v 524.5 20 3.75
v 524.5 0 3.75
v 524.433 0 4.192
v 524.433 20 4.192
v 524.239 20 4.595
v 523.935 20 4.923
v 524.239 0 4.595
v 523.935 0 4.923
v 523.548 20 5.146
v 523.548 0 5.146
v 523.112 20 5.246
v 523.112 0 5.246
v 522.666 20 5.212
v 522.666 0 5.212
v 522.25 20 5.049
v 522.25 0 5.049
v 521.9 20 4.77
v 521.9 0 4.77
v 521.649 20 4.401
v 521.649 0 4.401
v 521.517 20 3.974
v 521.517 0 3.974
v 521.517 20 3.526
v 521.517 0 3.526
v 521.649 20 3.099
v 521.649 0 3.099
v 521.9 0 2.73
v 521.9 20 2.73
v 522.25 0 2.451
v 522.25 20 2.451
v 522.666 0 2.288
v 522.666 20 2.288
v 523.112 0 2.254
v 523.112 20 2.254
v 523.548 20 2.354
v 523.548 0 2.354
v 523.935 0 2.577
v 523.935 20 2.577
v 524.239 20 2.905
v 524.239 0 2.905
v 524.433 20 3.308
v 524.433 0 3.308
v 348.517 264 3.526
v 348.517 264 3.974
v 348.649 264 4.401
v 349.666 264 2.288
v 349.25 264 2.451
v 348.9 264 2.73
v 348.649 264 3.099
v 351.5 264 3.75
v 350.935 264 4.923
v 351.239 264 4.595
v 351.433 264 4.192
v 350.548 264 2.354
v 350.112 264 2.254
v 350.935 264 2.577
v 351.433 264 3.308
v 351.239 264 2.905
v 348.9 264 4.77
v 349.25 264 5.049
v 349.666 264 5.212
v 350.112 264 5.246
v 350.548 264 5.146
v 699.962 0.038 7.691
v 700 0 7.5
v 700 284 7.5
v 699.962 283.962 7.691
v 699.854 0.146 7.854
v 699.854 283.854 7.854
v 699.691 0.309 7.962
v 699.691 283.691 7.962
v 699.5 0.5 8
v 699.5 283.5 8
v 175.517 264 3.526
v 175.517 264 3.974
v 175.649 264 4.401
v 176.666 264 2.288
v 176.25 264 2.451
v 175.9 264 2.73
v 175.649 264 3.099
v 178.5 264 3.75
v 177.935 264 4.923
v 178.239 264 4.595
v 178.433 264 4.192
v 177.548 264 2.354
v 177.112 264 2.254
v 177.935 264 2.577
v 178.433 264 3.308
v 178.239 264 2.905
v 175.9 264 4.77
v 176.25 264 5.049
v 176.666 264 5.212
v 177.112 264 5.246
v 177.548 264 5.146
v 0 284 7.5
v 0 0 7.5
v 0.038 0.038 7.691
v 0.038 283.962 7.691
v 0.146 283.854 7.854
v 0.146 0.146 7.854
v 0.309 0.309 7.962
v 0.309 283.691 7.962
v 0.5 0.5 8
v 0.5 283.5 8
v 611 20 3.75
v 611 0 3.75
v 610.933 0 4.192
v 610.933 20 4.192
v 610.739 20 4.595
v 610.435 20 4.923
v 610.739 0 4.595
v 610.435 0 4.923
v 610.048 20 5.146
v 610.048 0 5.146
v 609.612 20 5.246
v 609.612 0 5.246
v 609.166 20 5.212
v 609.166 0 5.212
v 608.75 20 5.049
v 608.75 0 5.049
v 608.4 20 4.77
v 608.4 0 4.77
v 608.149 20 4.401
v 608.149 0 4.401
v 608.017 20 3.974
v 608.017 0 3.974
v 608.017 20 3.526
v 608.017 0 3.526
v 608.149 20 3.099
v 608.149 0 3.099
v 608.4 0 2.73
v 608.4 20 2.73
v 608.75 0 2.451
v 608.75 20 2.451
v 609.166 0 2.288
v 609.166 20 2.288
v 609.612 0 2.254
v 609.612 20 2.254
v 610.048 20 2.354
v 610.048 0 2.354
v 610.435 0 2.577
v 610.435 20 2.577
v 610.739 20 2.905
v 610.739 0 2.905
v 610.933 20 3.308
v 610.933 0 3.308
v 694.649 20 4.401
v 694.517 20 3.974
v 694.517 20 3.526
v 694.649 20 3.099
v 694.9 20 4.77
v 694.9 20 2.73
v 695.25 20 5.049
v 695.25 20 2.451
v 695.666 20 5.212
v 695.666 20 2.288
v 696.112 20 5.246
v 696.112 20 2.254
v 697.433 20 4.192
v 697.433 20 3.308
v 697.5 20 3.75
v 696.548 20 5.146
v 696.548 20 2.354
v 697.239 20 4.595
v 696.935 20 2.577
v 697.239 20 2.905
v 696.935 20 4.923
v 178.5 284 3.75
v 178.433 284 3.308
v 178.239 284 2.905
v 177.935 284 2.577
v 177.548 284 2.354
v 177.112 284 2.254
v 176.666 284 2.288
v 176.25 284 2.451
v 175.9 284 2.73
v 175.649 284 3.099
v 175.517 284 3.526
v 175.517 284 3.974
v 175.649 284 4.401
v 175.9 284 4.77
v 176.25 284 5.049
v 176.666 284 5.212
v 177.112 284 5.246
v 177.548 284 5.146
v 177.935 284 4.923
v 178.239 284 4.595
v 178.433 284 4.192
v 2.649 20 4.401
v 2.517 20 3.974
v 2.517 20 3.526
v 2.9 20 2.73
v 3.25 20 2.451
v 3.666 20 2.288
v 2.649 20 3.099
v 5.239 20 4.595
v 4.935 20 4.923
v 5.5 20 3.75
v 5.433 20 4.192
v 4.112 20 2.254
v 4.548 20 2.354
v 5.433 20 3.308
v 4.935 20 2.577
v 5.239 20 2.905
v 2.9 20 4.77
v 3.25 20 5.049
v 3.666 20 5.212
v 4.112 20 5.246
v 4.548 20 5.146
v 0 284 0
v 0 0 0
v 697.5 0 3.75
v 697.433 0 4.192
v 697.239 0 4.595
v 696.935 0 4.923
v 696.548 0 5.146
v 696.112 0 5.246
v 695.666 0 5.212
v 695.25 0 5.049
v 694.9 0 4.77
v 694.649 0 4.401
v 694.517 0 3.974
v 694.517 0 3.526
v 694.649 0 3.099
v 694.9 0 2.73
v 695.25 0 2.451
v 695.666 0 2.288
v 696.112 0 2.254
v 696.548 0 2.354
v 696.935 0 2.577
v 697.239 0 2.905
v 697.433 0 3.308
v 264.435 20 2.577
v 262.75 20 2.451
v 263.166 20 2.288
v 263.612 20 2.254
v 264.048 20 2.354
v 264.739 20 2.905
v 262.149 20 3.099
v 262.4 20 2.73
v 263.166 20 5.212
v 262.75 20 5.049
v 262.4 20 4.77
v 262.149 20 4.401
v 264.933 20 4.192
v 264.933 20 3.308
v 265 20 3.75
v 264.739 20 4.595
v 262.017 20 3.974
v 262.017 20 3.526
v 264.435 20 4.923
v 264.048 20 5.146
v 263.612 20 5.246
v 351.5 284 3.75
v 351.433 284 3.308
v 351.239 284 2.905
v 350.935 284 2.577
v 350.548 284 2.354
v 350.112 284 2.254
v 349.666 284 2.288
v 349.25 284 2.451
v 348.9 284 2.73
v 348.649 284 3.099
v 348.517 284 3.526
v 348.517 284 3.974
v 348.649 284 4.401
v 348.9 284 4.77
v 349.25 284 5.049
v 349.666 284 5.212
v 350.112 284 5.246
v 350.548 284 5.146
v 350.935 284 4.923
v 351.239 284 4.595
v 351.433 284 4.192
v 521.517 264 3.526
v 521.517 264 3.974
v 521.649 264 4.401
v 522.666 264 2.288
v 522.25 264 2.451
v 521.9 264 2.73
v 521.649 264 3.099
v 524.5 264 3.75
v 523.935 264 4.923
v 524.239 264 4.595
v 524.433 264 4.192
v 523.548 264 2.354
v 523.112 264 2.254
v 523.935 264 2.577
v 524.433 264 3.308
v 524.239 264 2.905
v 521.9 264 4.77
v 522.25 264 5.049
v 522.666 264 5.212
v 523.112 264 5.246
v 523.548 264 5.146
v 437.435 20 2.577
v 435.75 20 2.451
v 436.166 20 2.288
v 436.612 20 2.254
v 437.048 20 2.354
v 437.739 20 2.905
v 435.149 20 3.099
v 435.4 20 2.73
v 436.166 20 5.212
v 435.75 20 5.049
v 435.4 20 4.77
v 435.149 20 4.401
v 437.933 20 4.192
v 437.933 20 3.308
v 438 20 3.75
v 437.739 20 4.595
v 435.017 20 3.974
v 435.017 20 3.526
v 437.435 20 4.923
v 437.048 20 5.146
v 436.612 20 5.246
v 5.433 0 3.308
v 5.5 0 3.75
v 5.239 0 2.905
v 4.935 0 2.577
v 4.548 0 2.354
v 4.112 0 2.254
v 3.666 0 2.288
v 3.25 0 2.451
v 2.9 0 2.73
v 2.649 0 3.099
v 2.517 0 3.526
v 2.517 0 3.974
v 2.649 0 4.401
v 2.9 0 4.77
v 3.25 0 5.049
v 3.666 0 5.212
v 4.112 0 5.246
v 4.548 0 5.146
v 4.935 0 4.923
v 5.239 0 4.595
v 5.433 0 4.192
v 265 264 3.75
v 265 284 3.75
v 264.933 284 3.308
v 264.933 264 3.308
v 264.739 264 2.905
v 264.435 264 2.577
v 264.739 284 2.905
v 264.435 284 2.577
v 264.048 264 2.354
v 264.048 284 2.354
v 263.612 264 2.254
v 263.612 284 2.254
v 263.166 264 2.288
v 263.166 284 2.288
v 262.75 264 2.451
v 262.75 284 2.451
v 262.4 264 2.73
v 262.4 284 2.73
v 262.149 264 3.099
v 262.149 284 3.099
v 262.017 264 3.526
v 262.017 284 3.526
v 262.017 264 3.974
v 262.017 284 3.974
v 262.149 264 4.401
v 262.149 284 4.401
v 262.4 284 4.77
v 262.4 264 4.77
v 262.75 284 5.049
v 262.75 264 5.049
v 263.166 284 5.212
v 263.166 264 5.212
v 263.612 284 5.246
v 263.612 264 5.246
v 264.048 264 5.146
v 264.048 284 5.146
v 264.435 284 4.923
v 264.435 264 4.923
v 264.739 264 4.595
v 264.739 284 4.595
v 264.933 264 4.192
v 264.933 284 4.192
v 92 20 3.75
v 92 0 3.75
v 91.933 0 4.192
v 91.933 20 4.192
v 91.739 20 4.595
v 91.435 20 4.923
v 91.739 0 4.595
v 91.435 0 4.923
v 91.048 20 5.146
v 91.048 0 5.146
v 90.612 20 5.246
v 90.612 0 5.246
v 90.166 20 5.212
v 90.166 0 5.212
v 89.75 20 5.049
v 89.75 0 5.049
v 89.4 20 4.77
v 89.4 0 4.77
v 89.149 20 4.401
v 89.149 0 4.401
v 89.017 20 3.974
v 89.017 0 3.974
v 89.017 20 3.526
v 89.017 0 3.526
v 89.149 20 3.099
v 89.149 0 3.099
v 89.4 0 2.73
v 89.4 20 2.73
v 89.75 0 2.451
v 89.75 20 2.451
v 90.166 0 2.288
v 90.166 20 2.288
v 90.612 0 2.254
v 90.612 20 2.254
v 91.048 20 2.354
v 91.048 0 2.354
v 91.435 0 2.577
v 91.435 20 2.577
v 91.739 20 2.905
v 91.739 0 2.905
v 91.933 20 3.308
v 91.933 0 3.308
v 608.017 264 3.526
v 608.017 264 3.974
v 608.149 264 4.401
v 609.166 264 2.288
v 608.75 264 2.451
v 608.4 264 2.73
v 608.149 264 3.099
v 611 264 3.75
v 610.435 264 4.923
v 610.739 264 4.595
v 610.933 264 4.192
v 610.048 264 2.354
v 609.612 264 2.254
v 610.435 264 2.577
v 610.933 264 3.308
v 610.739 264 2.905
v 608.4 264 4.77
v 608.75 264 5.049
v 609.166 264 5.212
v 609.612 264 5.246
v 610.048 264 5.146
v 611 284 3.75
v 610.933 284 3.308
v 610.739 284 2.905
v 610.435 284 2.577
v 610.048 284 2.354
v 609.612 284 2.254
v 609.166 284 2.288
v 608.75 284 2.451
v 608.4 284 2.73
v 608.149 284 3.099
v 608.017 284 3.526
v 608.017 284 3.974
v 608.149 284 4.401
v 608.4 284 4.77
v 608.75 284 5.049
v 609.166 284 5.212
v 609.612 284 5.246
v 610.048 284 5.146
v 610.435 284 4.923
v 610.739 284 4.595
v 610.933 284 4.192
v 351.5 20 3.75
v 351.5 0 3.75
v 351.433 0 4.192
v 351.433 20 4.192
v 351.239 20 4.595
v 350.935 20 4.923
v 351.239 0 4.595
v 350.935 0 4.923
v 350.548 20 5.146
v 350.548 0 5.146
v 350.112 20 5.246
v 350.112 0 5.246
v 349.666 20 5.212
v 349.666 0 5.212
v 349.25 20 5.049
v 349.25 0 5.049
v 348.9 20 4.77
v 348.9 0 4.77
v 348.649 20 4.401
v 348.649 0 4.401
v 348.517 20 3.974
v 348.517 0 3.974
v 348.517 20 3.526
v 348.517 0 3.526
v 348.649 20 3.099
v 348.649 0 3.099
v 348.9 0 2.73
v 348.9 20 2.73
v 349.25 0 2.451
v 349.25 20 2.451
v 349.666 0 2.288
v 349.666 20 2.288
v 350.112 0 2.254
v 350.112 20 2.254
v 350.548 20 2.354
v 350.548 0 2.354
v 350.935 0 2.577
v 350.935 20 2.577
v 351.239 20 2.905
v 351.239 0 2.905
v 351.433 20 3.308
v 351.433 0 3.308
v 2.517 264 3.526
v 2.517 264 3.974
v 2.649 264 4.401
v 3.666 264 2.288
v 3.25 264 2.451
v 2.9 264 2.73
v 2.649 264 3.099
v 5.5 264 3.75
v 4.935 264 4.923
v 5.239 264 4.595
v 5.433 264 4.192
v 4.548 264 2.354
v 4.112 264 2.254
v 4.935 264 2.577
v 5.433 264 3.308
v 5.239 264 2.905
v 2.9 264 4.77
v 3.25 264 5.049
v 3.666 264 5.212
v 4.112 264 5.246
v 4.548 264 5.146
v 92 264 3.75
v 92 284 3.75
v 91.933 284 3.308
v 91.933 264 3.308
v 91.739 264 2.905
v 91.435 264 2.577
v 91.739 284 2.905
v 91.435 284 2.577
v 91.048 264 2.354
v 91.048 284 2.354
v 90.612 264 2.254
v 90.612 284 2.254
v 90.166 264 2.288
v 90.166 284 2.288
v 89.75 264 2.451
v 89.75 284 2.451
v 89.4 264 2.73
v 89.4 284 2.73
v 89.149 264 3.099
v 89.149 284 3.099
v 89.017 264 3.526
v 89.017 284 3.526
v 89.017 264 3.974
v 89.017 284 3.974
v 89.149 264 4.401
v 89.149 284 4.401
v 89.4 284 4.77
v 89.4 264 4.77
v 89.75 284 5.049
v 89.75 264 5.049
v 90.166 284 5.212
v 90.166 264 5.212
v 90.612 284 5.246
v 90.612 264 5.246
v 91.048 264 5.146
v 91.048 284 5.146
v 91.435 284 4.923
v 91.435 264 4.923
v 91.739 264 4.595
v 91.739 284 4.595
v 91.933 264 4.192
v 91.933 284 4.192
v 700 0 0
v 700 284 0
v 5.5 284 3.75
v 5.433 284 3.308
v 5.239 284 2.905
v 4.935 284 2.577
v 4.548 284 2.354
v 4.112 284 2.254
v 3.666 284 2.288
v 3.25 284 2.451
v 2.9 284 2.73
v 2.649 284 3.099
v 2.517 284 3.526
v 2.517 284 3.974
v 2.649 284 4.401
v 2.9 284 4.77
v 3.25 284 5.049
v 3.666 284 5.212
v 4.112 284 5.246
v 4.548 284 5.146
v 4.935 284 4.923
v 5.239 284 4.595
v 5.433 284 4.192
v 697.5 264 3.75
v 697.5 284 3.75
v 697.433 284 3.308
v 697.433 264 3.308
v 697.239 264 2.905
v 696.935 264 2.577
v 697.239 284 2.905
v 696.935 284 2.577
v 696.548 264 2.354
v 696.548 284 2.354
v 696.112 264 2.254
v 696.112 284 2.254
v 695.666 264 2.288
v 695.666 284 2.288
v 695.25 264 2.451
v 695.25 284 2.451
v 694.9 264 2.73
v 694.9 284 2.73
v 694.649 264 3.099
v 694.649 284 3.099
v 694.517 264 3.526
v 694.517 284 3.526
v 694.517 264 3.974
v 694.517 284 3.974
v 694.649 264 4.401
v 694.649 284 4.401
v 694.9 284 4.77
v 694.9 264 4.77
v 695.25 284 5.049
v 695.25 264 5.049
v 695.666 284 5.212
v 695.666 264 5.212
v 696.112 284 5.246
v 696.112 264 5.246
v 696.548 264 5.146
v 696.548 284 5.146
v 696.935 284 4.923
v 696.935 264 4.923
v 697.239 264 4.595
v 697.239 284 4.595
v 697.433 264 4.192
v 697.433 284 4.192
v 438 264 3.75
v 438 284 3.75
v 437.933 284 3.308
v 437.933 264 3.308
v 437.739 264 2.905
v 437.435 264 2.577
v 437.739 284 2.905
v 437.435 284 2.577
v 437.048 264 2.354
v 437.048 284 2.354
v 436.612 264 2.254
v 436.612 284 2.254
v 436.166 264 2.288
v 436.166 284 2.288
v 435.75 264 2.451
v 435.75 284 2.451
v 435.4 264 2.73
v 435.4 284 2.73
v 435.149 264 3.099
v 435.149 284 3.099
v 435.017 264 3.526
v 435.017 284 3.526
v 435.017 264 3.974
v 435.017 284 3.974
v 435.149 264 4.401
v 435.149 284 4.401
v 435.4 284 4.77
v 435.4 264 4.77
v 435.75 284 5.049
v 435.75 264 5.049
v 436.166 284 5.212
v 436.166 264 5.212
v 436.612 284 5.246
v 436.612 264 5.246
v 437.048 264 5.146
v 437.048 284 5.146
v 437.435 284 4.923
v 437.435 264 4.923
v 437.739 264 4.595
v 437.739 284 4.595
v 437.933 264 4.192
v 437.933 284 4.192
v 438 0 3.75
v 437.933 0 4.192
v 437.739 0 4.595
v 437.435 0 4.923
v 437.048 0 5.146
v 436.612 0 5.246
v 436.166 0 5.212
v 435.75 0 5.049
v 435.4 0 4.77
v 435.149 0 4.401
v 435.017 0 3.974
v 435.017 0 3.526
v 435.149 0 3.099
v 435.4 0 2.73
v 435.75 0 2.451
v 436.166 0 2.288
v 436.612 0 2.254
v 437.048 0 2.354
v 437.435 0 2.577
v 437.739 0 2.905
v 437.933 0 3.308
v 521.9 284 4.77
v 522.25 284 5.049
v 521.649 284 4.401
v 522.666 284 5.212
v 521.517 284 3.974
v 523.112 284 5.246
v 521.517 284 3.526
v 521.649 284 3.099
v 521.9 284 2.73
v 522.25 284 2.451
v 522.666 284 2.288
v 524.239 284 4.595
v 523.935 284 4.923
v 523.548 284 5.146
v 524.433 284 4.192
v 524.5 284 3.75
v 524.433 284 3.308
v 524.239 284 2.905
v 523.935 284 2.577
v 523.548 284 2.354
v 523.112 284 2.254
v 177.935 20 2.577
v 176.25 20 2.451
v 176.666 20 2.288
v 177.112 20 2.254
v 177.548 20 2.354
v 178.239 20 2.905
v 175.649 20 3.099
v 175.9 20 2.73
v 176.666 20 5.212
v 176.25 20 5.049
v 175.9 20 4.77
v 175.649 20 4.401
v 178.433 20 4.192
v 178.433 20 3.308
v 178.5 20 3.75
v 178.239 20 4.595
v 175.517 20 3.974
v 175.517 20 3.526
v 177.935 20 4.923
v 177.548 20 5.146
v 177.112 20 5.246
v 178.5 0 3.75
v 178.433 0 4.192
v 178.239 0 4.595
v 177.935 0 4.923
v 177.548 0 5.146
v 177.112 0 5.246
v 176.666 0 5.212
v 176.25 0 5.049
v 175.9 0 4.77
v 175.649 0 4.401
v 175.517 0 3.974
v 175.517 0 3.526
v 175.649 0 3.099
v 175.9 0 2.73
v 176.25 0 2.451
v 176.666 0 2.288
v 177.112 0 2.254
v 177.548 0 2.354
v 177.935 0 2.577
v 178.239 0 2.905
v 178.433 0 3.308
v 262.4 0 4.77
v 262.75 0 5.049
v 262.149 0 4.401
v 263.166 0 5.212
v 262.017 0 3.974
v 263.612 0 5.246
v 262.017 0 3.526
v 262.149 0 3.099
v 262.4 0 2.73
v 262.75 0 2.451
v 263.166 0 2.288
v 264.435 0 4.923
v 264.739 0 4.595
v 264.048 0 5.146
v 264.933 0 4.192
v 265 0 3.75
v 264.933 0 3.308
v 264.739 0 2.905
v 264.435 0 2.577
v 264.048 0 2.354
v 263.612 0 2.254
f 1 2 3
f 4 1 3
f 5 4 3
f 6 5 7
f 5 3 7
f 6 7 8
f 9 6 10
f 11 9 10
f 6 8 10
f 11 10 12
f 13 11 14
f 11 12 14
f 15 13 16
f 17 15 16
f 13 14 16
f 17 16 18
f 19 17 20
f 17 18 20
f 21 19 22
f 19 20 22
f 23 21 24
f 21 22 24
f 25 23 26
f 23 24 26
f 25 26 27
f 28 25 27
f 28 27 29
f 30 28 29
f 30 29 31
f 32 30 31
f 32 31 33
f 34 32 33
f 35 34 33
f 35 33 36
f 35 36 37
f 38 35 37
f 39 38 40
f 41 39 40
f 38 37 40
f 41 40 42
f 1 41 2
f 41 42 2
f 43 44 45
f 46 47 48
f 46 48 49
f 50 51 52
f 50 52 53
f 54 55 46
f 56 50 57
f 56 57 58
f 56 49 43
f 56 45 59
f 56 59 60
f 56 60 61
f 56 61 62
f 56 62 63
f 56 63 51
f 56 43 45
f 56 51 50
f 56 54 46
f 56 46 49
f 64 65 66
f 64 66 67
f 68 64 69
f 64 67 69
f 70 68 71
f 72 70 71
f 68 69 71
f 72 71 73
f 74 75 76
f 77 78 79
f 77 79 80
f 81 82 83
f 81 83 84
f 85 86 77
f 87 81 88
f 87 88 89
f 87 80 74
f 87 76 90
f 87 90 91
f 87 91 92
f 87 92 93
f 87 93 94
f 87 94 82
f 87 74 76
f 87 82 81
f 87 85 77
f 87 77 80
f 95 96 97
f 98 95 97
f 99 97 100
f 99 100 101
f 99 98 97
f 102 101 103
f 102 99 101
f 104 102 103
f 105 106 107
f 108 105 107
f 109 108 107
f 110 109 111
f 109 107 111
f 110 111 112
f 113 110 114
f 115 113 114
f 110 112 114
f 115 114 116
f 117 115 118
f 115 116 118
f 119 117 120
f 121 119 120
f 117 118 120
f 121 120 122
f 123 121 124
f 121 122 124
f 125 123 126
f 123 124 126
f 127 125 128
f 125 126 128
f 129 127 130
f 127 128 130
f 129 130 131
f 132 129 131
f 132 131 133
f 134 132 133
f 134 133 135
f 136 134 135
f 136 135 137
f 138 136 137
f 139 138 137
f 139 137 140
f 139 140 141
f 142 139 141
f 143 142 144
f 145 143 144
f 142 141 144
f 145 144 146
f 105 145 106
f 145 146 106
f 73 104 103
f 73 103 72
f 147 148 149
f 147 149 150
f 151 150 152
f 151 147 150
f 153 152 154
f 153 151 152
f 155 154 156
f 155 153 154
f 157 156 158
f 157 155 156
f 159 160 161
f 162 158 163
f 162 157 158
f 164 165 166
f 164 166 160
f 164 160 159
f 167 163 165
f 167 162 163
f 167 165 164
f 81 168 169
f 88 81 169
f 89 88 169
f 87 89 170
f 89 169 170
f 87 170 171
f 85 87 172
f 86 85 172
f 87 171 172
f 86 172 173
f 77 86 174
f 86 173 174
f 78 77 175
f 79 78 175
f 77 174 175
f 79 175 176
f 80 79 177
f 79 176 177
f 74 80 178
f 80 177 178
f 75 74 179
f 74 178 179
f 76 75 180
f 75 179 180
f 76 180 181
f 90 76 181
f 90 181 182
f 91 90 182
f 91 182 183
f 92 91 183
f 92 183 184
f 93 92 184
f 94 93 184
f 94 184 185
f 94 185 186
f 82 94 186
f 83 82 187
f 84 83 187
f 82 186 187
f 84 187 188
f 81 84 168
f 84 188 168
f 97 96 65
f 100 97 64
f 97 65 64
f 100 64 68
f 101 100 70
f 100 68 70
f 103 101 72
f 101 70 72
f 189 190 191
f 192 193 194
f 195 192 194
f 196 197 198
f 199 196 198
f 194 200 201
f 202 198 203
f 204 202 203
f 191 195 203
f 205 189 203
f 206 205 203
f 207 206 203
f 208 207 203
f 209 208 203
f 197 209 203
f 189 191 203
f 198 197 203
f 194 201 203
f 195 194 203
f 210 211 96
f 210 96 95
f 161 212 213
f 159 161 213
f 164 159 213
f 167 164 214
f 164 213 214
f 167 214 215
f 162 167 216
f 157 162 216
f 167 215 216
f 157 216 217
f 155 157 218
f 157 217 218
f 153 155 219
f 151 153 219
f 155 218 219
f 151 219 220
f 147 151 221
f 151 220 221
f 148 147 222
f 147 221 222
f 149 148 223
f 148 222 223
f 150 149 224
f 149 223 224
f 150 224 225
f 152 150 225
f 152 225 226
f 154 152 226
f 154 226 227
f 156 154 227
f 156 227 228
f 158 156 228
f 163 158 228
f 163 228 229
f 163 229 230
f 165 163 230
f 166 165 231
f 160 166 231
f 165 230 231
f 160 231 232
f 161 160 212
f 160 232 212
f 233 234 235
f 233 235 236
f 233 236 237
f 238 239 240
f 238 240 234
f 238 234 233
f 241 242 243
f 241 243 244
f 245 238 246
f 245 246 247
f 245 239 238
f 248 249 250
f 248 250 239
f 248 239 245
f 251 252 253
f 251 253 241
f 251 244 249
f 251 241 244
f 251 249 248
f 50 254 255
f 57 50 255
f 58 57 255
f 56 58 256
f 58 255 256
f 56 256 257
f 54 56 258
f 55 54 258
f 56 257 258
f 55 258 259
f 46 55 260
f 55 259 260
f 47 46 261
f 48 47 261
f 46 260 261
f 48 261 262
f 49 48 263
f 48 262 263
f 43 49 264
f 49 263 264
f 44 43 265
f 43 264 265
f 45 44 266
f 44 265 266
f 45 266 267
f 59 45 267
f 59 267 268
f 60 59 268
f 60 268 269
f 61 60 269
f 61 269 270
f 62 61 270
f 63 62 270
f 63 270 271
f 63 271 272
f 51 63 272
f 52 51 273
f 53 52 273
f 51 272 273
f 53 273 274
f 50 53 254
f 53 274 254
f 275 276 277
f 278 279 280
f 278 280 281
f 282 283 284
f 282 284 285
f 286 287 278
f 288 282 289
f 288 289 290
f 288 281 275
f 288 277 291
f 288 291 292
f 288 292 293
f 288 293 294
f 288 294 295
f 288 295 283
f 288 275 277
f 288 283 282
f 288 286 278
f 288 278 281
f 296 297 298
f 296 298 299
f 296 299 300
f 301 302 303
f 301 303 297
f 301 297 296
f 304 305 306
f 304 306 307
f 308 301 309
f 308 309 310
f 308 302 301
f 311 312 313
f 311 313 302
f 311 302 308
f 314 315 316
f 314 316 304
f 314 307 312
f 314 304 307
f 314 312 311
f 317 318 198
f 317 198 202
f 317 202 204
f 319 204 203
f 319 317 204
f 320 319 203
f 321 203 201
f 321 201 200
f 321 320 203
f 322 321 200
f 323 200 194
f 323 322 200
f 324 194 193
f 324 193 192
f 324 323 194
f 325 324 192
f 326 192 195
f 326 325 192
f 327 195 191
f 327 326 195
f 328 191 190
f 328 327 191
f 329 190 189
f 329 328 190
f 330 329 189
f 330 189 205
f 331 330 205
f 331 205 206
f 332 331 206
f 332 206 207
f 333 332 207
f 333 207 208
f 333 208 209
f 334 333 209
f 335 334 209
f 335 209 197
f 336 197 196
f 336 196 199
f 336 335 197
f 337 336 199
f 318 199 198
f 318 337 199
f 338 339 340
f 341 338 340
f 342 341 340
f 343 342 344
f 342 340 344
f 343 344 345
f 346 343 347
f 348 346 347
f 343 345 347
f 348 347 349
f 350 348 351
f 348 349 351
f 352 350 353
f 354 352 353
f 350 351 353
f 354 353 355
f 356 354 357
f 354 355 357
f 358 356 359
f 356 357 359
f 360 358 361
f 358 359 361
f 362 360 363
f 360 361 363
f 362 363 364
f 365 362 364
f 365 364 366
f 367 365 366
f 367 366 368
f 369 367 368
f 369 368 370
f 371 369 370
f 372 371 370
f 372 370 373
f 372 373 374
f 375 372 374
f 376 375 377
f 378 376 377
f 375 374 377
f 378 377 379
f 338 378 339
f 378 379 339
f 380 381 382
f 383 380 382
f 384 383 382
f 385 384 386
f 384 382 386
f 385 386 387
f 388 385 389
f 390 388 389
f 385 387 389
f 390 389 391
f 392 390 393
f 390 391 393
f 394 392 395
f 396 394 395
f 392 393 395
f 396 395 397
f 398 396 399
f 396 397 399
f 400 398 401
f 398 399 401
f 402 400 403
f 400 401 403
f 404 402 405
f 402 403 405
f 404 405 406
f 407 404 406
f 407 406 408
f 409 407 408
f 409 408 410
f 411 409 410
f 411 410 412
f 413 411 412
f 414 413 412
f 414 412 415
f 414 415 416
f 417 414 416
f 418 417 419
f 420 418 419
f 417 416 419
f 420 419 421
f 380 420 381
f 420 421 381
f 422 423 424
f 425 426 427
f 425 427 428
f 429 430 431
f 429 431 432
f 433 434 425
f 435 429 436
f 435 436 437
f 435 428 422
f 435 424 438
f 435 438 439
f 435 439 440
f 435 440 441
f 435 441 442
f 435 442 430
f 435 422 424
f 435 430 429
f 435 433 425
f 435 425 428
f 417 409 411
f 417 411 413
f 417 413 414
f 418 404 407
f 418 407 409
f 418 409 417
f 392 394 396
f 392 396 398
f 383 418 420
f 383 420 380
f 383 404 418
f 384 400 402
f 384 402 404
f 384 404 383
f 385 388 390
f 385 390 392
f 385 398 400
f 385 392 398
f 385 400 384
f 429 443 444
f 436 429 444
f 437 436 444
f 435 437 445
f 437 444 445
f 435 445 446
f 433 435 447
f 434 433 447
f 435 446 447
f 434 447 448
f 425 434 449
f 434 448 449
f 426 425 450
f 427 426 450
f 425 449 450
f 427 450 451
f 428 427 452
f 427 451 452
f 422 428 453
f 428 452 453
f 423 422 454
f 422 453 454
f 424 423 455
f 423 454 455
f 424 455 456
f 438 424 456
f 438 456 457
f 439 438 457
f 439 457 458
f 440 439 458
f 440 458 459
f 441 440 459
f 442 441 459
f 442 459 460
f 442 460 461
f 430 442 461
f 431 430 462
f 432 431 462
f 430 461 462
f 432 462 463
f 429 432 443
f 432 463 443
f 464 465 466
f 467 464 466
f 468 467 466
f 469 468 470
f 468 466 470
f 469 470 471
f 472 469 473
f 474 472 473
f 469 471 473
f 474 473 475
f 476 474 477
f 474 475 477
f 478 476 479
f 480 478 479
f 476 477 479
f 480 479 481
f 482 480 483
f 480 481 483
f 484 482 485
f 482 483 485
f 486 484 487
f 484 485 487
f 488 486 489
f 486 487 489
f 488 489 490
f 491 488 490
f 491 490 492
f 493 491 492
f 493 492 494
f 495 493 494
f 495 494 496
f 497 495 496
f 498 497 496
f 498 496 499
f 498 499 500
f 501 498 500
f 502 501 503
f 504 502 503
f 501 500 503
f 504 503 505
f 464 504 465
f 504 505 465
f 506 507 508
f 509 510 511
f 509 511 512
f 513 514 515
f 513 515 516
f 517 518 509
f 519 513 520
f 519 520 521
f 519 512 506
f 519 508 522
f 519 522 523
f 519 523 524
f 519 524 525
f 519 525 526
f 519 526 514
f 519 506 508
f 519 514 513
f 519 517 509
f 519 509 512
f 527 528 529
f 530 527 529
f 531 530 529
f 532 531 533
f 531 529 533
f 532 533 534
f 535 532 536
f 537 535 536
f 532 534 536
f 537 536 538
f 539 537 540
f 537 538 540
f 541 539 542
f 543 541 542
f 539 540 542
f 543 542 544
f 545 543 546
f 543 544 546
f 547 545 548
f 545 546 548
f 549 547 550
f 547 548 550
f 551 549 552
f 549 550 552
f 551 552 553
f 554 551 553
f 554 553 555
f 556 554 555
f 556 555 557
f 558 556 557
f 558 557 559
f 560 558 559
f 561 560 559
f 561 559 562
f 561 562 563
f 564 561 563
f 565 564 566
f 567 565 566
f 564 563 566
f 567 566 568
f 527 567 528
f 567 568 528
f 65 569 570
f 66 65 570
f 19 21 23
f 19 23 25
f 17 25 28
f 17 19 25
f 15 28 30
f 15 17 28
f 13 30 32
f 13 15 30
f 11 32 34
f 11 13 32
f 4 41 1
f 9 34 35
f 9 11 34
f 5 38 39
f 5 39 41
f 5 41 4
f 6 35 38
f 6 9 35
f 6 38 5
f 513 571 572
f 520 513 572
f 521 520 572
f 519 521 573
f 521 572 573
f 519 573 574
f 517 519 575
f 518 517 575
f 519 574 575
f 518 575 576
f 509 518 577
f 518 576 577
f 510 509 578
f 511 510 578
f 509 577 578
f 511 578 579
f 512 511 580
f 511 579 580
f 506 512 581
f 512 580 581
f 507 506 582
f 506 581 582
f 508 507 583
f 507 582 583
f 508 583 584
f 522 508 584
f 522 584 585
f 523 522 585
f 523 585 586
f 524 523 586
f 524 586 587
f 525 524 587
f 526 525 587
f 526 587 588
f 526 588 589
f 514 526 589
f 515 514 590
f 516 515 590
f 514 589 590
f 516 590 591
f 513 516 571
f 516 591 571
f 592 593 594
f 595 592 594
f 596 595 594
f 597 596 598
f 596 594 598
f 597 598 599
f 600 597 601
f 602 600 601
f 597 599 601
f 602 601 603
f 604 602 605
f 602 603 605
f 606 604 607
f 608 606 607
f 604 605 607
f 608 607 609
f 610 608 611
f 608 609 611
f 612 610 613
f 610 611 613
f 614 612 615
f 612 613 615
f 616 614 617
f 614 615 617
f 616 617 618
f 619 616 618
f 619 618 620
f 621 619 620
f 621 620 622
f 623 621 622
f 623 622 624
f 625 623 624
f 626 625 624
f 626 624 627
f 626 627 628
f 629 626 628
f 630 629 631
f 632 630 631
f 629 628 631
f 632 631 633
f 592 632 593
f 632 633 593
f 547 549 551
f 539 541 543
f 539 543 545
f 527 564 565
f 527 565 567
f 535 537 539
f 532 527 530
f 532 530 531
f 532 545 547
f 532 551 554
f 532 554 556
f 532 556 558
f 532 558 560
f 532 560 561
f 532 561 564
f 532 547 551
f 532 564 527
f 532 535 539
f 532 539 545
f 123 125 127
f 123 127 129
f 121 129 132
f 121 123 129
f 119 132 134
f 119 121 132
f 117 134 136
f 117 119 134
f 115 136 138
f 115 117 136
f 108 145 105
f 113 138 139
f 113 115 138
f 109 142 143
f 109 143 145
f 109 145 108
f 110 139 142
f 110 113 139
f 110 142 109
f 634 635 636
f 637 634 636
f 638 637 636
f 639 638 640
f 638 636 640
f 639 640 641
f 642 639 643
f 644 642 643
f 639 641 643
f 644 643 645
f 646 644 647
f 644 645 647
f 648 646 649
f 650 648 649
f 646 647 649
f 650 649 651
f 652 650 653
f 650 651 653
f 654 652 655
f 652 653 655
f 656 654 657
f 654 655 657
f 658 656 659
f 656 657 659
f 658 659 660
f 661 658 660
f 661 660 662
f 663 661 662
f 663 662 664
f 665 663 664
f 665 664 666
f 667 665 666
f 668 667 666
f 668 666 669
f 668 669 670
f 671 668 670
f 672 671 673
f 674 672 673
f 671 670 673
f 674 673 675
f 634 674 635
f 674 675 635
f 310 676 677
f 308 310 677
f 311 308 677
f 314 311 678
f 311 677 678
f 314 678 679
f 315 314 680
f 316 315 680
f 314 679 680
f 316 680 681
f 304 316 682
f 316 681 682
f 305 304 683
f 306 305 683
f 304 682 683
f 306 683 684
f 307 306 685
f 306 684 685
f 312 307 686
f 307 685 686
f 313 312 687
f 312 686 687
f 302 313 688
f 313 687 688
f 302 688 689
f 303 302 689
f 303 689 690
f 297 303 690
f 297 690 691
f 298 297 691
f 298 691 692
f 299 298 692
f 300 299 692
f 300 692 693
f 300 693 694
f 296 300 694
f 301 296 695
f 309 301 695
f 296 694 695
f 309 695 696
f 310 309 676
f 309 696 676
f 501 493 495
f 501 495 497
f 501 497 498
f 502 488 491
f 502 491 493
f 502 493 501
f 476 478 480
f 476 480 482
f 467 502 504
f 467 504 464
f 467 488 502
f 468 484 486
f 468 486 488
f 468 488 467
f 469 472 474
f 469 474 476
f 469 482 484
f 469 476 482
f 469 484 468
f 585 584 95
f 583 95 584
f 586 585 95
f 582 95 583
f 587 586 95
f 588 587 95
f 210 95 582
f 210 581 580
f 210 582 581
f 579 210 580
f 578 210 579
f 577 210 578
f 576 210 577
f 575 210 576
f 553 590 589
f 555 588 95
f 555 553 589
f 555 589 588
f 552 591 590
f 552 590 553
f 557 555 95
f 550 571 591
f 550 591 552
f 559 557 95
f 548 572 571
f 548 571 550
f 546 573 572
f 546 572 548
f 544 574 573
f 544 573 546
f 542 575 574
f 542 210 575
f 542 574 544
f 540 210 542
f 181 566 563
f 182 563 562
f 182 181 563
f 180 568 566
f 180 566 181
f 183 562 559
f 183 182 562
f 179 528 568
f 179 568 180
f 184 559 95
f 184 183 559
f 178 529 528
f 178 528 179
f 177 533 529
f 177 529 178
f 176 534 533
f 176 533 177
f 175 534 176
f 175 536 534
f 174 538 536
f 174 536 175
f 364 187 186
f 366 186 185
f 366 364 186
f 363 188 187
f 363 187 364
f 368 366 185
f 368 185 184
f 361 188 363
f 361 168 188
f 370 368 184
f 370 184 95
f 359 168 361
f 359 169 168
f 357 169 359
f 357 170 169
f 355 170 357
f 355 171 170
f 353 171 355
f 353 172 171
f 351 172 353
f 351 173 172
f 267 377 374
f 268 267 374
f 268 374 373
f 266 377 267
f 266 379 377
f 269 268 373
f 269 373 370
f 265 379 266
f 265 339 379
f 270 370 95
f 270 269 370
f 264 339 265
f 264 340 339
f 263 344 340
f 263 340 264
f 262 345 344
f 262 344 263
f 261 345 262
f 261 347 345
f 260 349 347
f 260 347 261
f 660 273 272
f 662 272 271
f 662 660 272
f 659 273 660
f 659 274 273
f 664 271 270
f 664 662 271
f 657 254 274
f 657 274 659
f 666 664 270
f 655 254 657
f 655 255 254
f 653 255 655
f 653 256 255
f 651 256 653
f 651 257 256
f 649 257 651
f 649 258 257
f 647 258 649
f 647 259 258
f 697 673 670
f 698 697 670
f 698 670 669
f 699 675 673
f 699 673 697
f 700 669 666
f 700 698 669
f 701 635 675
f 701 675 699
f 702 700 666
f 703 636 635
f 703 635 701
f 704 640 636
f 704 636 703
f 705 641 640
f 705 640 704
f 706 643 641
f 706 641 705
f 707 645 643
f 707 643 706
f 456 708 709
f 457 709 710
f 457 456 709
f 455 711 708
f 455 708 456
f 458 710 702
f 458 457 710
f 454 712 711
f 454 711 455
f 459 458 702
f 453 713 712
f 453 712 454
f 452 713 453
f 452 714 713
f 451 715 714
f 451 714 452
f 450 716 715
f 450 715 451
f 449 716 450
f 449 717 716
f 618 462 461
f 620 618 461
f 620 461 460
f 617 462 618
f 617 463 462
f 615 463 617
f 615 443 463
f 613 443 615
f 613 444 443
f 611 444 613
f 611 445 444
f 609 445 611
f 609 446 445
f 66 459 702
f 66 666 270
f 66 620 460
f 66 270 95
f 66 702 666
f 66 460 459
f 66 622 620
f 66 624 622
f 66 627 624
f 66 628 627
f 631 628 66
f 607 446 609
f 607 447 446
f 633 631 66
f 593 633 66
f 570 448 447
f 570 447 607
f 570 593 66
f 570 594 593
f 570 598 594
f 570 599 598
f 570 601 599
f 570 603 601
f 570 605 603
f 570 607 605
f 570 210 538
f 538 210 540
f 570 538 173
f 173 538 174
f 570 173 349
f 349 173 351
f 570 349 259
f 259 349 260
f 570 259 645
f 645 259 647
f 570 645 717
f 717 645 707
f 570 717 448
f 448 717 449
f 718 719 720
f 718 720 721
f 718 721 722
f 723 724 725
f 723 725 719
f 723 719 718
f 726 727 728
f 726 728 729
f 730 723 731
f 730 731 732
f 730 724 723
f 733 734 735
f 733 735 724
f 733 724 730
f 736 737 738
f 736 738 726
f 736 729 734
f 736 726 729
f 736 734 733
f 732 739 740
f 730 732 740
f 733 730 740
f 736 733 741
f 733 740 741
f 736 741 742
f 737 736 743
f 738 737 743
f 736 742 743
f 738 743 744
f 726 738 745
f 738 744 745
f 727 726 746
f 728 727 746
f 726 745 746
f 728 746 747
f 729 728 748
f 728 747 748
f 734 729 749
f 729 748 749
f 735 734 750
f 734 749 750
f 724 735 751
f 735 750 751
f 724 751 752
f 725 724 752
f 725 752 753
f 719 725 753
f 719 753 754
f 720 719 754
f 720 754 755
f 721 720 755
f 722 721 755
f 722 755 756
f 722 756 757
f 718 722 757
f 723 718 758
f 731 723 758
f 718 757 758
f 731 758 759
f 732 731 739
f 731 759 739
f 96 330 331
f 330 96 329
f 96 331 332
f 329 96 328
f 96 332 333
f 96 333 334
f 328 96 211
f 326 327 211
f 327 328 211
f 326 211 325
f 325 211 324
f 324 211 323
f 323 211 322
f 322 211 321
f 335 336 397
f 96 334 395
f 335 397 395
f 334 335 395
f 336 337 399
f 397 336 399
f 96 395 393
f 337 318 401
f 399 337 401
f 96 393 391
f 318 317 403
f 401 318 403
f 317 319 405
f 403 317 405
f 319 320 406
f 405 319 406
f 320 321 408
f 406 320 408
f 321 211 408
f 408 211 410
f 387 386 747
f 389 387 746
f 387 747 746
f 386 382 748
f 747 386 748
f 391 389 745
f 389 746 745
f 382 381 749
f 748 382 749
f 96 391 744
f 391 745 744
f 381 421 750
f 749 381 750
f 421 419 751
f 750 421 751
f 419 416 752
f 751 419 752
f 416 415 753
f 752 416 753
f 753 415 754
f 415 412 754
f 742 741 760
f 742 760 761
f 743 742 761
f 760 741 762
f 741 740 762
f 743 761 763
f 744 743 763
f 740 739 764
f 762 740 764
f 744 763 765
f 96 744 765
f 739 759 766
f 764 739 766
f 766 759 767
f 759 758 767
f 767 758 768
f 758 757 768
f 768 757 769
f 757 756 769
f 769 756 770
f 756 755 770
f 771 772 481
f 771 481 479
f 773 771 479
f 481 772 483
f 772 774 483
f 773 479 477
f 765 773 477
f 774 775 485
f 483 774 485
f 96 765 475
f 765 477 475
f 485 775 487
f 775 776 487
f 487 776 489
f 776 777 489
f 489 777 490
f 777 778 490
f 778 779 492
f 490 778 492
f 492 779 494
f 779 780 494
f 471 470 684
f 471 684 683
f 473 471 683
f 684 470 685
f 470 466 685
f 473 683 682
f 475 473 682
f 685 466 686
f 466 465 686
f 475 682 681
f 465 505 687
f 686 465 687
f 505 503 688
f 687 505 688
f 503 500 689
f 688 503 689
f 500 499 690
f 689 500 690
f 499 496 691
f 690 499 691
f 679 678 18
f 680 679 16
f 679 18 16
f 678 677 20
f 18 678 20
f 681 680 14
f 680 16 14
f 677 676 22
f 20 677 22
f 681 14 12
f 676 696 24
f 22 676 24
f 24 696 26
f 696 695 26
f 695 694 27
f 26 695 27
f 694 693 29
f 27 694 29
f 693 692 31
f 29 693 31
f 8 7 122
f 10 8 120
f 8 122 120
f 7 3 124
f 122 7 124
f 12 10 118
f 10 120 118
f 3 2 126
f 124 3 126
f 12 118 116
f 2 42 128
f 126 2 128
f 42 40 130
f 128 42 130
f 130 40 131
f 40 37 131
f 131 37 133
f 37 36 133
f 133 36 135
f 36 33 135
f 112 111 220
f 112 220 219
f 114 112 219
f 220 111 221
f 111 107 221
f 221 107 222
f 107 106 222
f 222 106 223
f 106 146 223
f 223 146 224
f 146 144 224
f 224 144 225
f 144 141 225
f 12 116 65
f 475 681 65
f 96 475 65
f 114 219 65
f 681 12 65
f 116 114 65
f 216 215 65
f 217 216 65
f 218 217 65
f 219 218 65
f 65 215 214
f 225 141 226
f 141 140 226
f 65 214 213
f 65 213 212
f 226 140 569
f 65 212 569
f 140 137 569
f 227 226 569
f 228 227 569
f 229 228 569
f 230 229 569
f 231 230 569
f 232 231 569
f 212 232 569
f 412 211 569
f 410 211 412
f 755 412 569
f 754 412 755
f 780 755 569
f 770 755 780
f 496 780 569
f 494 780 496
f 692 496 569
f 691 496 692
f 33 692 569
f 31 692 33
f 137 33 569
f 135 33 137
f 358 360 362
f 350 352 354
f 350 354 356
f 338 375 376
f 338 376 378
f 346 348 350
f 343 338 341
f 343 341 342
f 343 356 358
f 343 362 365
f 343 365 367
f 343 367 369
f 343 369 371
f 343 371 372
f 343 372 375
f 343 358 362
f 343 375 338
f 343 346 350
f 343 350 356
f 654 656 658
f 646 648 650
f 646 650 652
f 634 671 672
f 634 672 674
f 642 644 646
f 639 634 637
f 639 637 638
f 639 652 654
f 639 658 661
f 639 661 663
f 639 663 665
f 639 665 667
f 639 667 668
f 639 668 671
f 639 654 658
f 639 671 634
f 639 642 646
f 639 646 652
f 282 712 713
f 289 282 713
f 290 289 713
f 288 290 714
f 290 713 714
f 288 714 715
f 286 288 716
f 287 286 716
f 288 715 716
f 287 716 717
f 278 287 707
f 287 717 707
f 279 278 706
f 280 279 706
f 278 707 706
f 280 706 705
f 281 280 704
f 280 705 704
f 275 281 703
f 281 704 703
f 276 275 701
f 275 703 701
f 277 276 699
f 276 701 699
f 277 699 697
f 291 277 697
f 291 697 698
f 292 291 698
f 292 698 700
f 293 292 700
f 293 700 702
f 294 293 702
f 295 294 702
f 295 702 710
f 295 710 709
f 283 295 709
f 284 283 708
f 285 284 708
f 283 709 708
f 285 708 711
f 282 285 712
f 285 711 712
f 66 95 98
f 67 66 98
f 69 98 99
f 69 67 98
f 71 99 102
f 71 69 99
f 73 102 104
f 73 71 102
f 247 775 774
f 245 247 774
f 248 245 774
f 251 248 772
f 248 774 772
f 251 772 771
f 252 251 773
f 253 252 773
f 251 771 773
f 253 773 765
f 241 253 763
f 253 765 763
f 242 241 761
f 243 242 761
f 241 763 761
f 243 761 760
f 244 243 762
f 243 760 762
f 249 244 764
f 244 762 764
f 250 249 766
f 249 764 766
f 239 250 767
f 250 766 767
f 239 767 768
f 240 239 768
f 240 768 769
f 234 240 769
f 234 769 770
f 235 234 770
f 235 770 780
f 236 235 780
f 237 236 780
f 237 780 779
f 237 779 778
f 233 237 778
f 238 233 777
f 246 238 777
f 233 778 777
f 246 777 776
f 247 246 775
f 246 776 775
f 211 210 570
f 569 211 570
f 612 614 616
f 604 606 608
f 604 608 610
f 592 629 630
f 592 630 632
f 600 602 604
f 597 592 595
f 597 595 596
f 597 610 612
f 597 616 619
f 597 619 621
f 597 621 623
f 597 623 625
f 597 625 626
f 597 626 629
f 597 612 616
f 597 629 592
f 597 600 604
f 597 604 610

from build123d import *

# Parameters (mm, degrees)
SKETCH1_W               = 700
SKETCH1_H               = 284
BOSS_EXTRUDE1_DEPTH     = 8
FILLET1_R               = 0.5
SKETCH8_R               = 1.5
CUT_EXTRUDE6_DEPTH      = 20
LPATTERN4_COUNT         = 9
LPATTERN4_PITCH         = 86.5
MIRROR1_COPY_1_SKETCH_R = 1.5
MIRROR1_COPY_1_DEPTH    = 20
MIRROR1_COPY_2_SKETCH_R = 1.5
MIRROR1_COPY_2_DEPTH    = 20
MIRROR1_COPY_3_SKETCH_R = 1.5
MIRROR1_COPY_3_DEPTH    = 20
MIRROR1_COPY_4_SKETCH_R = 1.5
MIRROR1_COPY_4_DEPTH    = 20
MIRROR1_COPY_5_SKETCH_R = 1.5
MIRROR1_COPY_5_DEPTH    = 20
MIRROR1_COPY_6_SKETCH_R = 1.5
MIRROR1_COPY_6_DEPTH    = 20
MIRROR1_COPY_7_SKETCH_R = 1.5
MIRROR1_COPY_7_DEPTH    = 20
MIRROR1_COPY_8_SKETCH_R = 1.5
MIRROR1_COPY_8_DEPTH    = 20


with BuildPart() as part:
    # Sketch1 → Boss-Extrude1 (new body)
    with BuildSketch(Plane.XY):
        with Locations((350, 142)):
            Rectangle(SKETCH1_W, SKETCH1_H)
    extrude(amount=BOSS_EXTRUDE1_DEPTH)

    # Fillet1
    fillet1_edges = [part.edges().sort_by_distance(p)[0] for p in [
        (700, 142, 8),
        (350, 284, 8),
        (0, 142, 8),
        (350, 0, 8),
    ]]
    fillet(fillet1_edges, radius=FILLET1_R)

    # Sketch8 → Cut-Extrude6 (cut)
    with BuildSketch(Plane(origin=(0, 284, 0), x_dir=(1, 0, 0), z_dir=(0, 1, 0))):
        with Locations((4, -3.75)):
            Circle(SKETCH8_R)
    cut_extrude6 = extrude(amount=-CUT_EXTRUDE6_DEPTH, mode=Mode.SUBTRACT)

    # LPattern4: Cut-Extrude6 ×9
    with Locations(*[(i * LPATTERN4_PITCH, 0, 0) for i in range(1, LPATTERN4_COUNT)]):
        add(cut_extrude6, mode=Mode.SUBTRACT)

    # Mirror1: Cut-Extrude6 across plane
    add(cut_extrude6.mirror(Plane.ZX.offset(142)), mode=Mode.SUBTRACT)

    # Mirror1 copy 1 sketch → Mirror1 copy 1 (cut)
    with BuildSketch(Plane(origin=(86.5, 0, 0), x_dir=(1, 0, 0), z_dir=(0, -1, 0))):
        with Locations((4, 3.75)):
            Circle(MIRROR1_COPY_1_SKETCH_R)
    extrude(amount=-MIRROR1_COPY_1_DEPTH, mode=Mode.SUBTRACT)

    # Mirror1 copy 2 sketch → Mirror1 copy 2 (cut)
    with BuildSketch(Plane(origin=(173, 0, 0), x_dir=(1, 0, 0), z_dir=(0, -1, 0))):
        with Locations((4, 3.75)):
            Circle(MIRROR1_COPY_2_SKETCH_R)
    extrude(amount=-MIRROR1_COPY_2_DEPTH, mode=Mode.SUBTRACT)

    # Mirror1 copy 3 sketch → Mirror1 copy 3 (cut)
    with BuildSketch(Plane(origin=(259.5, 0, 0), x_dir=(1, 0, 0), z_dir=(0, -1, 0))):
        with Locations((4, 3.75)):
            Circle(MIRROR1_COPY_3_SKETCH_R)
    extrude(amount=-MIRROR1_COPY_3_DEPTH, mode=Mode.SUBTRACT)

    # Mirror1 copy 4 sketch → Mirror1 copy 4 (cut)
    with BuildSketch(Plane(origin=(346, 0, 0), x_dir=(1, 0, 0), z_dir=(0, -1, 0))):
        with Locations((4, 3.75)):
            Circle(MIRROR1_COPY_4_SKETCH_R)
    extrude(amount=-MIRROR1_COPY_4_DEPTH, mode=Mode.SUBTRACT)

    # Mirror1 copy 5 sketch → Mirror1 copy 5 (cut)
    with BuildSketch(Plane(origin=(432.5, 0, 0), x_dir=(1, 0, 0), z_dir=(0, -1, 0))):
        with Locations((4, 3.75)):
            Circle(MIRROR1_COPY_5_SKETCH_R)
    extrude(amount=-MIRROR1_COPY_5_DEPTH, mode=Mode.SUBTRACT)

    # Mirror1 copy 6 sketch → Mirror1 copy 6 (cut)
    with BuildSketch(Plane(origin=(519, 0, 0), x_dir=(1, 0, 0), z_dir=(0, -1, 0))):
        with Locations((4, 3.75)):
            Circle(MIRROR1_COPY_6_SKETCH_R)
    extrude(amount=-MIRROR1_COPY_6_DEPTH, mode=Mode.SUBTRACT)

    # Mirror1 copy 7 sketch → Mirror1 copy 7 (cut)
    with BuildSketch(Plane(origin=(605.5, 0, 0), x_dir=(1, 0, 0), z_dir=(0, -1, 0))):
        with Locations((4, 3.75)):
            Circle(MIRROR1_COPY_7_SKETCH_R)
    extrude(amount=-MIRROR1_COPY_7_DEPTH, mode=Mode.SUBTRACT)

    # Mirror1 copy 8 sketch → Mirror1 copy 8 (cut)
    with BuildSketch(Plane(origin=(692, 0, 0), x_dir=(1, 0, 0), z_dir=(0, -1, 0))):
        with Locations((4, 3.75)):
            Circle(MIRROR1_COPY_8_SKETCH_R)
    extrude(amount=-MIRROR1_COPY_8_DEPTH, mode=Mode.SUBTRACT)


solid = part.part
